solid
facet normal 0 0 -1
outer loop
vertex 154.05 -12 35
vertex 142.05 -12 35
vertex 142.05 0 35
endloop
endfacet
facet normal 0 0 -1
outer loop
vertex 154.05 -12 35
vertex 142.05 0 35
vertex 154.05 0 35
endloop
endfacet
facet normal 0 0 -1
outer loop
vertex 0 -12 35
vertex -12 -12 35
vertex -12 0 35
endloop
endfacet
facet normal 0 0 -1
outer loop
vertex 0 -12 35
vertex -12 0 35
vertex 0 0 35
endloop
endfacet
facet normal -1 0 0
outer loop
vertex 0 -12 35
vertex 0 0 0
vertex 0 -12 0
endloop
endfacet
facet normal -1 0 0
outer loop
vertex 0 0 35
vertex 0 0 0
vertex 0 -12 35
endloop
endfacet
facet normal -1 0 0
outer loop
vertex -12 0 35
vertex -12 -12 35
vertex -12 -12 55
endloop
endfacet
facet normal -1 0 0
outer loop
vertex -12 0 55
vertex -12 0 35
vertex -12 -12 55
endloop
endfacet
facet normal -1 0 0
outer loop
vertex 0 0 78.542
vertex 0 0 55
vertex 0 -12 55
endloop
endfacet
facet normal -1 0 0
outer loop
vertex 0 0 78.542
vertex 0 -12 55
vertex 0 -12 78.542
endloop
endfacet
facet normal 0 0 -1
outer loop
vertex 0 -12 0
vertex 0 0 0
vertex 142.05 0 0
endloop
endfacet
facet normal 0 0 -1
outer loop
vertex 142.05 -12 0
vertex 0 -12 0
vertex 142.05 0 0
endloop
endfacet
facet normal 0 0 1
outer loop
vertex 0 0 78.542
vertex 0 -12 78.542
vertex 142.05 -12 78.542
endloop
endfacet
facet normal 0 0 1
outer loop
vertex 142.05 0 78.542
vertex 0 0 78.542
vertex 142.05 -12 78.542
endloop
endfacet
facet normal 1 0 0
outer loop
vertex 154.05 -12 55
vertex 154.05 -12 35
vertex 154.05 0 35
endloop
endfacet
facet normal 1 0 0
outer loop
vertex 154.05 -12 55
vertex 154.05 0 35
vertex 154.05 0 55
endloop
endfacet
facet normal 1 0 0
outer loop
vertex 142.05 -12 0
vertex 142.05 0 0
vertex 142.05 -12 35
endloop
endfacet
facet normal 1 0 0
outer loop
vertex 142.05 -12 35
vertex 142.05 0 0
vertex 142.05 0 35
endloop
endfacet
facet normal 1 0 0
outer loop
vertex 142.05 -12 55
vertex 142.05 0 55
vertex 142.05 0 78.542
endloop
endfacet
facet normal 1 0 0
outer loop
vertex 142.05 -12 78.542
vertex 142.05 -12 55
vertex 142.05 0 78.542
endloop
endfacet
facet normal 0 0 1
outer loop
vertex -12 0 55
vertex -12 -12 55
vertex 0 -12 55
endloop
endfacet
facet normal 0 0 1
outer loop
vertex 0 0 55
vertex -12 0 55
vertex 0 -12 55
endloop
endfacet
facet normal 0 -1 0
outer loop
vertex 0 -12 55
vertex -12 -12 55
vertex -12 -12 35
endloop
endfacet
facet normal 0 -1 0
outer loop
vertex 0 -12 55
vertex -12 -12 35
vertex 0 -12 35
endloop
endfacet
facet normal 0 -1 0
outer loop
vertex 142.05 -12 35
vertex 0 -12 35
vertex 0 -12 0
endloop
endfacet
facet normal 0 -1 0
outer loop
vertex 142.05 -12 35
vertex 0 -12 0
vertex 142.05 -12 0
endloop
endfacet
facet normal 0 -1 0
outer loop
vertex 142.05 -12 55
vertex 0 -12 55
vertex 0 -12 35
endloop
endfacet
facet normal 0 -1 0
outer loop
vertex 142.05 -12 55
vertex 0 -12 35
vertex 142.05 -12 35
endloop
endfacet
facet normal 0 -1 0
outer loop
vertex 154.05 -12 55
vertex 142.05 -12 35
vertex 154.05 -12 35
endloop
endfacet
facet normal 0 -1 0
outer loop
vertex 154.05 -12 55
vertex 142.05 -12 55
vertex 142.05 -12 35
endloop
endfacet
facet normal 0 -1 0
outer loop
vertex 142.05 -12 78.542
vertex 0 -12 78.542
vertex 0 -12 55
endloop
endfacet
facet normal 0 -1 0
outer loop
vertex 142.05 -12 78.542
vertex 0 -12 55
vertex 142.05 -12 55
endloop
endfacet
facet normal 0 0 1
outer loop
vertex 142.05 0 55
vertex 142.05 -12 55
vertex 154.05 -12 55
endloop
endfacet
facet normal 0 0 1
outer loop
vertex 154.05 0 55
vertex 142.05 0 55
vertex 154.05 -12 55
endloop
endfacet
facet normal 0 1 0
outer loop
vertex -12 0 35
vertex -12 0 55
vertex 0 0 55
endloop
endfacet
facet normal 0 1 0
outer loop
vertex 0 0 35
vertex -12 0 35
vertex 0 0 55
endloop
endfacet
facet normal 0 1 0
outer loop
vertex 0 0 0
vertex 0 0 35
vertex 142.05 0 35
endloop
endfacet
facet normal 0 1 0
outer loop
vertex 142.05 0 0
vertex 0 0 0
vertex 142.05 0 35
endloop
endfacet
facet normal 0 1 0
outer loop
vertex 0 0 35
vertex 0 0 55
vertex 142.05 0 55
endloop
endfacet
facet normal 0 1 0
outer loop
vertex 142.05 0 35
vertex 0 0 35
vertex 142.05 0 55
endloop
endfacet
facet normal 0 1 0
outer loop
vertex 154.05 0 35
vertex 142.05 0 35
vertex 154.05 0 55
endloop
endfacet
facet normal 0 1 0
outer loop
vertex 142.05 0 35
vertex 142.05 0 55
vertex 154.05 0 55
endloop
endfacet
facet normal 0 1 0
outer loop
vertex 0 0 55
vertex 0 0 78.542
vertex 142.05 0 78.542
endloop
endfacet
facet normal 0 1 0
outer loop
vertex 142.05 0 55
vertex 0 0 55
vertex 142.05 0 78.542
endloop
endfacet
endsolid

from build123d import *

# Parameters (mm, degrees)
F0_W     = 142.05
F0_H     = 90
F1_DEPTH = 12
F2_W     = 24
F2_H     = 20
F3_DEPTH = 12
F4_DEPTH = 10.02627
F5_W     = 142.05
F5_H     = 1.43163
F6_DEPTH = 25


with BuildPart() as f1:
    # F0 (on Front) → F1 (new body)
    with BuildSketch(Plane.XZ):
        with Locations((71.025, 45)):
            Rectangle(F0_W, F0_H)
    extrude(amount=F1_DEPTH)

    # F2 (on face) → F3 (join)
    with BuildSketch(Plane.XZ.offset(12)):
        with Locations((0, 45)):
            Rectangle(F2_W, F2_H)
        with Locations((142.05, 45)):
            Rectangle(F2_W, F2_H)
    extrude(amount=-F3_DEPTH)

    # F4 (cut): a face of the model
    f4_faces = [f1.faces().sort_by_distance(p)[0] for p in [
        (71.025, -6, 90),
    ]]
    extrude(f4_faces, amount=-F4_DEPTH, mode=Mode.SUBTRACT)

    # F5 (on face) → F6 (cut)
    with BuildSketch(Plane.XZ.offset(12)):
        with Locations((71.025, 79.257915)):
            Rectangle(F5_W, F5_H)
    extrude(amount=-F6_DEPTH, mode=Mode.SUBTRACT)


solid = f1.part
